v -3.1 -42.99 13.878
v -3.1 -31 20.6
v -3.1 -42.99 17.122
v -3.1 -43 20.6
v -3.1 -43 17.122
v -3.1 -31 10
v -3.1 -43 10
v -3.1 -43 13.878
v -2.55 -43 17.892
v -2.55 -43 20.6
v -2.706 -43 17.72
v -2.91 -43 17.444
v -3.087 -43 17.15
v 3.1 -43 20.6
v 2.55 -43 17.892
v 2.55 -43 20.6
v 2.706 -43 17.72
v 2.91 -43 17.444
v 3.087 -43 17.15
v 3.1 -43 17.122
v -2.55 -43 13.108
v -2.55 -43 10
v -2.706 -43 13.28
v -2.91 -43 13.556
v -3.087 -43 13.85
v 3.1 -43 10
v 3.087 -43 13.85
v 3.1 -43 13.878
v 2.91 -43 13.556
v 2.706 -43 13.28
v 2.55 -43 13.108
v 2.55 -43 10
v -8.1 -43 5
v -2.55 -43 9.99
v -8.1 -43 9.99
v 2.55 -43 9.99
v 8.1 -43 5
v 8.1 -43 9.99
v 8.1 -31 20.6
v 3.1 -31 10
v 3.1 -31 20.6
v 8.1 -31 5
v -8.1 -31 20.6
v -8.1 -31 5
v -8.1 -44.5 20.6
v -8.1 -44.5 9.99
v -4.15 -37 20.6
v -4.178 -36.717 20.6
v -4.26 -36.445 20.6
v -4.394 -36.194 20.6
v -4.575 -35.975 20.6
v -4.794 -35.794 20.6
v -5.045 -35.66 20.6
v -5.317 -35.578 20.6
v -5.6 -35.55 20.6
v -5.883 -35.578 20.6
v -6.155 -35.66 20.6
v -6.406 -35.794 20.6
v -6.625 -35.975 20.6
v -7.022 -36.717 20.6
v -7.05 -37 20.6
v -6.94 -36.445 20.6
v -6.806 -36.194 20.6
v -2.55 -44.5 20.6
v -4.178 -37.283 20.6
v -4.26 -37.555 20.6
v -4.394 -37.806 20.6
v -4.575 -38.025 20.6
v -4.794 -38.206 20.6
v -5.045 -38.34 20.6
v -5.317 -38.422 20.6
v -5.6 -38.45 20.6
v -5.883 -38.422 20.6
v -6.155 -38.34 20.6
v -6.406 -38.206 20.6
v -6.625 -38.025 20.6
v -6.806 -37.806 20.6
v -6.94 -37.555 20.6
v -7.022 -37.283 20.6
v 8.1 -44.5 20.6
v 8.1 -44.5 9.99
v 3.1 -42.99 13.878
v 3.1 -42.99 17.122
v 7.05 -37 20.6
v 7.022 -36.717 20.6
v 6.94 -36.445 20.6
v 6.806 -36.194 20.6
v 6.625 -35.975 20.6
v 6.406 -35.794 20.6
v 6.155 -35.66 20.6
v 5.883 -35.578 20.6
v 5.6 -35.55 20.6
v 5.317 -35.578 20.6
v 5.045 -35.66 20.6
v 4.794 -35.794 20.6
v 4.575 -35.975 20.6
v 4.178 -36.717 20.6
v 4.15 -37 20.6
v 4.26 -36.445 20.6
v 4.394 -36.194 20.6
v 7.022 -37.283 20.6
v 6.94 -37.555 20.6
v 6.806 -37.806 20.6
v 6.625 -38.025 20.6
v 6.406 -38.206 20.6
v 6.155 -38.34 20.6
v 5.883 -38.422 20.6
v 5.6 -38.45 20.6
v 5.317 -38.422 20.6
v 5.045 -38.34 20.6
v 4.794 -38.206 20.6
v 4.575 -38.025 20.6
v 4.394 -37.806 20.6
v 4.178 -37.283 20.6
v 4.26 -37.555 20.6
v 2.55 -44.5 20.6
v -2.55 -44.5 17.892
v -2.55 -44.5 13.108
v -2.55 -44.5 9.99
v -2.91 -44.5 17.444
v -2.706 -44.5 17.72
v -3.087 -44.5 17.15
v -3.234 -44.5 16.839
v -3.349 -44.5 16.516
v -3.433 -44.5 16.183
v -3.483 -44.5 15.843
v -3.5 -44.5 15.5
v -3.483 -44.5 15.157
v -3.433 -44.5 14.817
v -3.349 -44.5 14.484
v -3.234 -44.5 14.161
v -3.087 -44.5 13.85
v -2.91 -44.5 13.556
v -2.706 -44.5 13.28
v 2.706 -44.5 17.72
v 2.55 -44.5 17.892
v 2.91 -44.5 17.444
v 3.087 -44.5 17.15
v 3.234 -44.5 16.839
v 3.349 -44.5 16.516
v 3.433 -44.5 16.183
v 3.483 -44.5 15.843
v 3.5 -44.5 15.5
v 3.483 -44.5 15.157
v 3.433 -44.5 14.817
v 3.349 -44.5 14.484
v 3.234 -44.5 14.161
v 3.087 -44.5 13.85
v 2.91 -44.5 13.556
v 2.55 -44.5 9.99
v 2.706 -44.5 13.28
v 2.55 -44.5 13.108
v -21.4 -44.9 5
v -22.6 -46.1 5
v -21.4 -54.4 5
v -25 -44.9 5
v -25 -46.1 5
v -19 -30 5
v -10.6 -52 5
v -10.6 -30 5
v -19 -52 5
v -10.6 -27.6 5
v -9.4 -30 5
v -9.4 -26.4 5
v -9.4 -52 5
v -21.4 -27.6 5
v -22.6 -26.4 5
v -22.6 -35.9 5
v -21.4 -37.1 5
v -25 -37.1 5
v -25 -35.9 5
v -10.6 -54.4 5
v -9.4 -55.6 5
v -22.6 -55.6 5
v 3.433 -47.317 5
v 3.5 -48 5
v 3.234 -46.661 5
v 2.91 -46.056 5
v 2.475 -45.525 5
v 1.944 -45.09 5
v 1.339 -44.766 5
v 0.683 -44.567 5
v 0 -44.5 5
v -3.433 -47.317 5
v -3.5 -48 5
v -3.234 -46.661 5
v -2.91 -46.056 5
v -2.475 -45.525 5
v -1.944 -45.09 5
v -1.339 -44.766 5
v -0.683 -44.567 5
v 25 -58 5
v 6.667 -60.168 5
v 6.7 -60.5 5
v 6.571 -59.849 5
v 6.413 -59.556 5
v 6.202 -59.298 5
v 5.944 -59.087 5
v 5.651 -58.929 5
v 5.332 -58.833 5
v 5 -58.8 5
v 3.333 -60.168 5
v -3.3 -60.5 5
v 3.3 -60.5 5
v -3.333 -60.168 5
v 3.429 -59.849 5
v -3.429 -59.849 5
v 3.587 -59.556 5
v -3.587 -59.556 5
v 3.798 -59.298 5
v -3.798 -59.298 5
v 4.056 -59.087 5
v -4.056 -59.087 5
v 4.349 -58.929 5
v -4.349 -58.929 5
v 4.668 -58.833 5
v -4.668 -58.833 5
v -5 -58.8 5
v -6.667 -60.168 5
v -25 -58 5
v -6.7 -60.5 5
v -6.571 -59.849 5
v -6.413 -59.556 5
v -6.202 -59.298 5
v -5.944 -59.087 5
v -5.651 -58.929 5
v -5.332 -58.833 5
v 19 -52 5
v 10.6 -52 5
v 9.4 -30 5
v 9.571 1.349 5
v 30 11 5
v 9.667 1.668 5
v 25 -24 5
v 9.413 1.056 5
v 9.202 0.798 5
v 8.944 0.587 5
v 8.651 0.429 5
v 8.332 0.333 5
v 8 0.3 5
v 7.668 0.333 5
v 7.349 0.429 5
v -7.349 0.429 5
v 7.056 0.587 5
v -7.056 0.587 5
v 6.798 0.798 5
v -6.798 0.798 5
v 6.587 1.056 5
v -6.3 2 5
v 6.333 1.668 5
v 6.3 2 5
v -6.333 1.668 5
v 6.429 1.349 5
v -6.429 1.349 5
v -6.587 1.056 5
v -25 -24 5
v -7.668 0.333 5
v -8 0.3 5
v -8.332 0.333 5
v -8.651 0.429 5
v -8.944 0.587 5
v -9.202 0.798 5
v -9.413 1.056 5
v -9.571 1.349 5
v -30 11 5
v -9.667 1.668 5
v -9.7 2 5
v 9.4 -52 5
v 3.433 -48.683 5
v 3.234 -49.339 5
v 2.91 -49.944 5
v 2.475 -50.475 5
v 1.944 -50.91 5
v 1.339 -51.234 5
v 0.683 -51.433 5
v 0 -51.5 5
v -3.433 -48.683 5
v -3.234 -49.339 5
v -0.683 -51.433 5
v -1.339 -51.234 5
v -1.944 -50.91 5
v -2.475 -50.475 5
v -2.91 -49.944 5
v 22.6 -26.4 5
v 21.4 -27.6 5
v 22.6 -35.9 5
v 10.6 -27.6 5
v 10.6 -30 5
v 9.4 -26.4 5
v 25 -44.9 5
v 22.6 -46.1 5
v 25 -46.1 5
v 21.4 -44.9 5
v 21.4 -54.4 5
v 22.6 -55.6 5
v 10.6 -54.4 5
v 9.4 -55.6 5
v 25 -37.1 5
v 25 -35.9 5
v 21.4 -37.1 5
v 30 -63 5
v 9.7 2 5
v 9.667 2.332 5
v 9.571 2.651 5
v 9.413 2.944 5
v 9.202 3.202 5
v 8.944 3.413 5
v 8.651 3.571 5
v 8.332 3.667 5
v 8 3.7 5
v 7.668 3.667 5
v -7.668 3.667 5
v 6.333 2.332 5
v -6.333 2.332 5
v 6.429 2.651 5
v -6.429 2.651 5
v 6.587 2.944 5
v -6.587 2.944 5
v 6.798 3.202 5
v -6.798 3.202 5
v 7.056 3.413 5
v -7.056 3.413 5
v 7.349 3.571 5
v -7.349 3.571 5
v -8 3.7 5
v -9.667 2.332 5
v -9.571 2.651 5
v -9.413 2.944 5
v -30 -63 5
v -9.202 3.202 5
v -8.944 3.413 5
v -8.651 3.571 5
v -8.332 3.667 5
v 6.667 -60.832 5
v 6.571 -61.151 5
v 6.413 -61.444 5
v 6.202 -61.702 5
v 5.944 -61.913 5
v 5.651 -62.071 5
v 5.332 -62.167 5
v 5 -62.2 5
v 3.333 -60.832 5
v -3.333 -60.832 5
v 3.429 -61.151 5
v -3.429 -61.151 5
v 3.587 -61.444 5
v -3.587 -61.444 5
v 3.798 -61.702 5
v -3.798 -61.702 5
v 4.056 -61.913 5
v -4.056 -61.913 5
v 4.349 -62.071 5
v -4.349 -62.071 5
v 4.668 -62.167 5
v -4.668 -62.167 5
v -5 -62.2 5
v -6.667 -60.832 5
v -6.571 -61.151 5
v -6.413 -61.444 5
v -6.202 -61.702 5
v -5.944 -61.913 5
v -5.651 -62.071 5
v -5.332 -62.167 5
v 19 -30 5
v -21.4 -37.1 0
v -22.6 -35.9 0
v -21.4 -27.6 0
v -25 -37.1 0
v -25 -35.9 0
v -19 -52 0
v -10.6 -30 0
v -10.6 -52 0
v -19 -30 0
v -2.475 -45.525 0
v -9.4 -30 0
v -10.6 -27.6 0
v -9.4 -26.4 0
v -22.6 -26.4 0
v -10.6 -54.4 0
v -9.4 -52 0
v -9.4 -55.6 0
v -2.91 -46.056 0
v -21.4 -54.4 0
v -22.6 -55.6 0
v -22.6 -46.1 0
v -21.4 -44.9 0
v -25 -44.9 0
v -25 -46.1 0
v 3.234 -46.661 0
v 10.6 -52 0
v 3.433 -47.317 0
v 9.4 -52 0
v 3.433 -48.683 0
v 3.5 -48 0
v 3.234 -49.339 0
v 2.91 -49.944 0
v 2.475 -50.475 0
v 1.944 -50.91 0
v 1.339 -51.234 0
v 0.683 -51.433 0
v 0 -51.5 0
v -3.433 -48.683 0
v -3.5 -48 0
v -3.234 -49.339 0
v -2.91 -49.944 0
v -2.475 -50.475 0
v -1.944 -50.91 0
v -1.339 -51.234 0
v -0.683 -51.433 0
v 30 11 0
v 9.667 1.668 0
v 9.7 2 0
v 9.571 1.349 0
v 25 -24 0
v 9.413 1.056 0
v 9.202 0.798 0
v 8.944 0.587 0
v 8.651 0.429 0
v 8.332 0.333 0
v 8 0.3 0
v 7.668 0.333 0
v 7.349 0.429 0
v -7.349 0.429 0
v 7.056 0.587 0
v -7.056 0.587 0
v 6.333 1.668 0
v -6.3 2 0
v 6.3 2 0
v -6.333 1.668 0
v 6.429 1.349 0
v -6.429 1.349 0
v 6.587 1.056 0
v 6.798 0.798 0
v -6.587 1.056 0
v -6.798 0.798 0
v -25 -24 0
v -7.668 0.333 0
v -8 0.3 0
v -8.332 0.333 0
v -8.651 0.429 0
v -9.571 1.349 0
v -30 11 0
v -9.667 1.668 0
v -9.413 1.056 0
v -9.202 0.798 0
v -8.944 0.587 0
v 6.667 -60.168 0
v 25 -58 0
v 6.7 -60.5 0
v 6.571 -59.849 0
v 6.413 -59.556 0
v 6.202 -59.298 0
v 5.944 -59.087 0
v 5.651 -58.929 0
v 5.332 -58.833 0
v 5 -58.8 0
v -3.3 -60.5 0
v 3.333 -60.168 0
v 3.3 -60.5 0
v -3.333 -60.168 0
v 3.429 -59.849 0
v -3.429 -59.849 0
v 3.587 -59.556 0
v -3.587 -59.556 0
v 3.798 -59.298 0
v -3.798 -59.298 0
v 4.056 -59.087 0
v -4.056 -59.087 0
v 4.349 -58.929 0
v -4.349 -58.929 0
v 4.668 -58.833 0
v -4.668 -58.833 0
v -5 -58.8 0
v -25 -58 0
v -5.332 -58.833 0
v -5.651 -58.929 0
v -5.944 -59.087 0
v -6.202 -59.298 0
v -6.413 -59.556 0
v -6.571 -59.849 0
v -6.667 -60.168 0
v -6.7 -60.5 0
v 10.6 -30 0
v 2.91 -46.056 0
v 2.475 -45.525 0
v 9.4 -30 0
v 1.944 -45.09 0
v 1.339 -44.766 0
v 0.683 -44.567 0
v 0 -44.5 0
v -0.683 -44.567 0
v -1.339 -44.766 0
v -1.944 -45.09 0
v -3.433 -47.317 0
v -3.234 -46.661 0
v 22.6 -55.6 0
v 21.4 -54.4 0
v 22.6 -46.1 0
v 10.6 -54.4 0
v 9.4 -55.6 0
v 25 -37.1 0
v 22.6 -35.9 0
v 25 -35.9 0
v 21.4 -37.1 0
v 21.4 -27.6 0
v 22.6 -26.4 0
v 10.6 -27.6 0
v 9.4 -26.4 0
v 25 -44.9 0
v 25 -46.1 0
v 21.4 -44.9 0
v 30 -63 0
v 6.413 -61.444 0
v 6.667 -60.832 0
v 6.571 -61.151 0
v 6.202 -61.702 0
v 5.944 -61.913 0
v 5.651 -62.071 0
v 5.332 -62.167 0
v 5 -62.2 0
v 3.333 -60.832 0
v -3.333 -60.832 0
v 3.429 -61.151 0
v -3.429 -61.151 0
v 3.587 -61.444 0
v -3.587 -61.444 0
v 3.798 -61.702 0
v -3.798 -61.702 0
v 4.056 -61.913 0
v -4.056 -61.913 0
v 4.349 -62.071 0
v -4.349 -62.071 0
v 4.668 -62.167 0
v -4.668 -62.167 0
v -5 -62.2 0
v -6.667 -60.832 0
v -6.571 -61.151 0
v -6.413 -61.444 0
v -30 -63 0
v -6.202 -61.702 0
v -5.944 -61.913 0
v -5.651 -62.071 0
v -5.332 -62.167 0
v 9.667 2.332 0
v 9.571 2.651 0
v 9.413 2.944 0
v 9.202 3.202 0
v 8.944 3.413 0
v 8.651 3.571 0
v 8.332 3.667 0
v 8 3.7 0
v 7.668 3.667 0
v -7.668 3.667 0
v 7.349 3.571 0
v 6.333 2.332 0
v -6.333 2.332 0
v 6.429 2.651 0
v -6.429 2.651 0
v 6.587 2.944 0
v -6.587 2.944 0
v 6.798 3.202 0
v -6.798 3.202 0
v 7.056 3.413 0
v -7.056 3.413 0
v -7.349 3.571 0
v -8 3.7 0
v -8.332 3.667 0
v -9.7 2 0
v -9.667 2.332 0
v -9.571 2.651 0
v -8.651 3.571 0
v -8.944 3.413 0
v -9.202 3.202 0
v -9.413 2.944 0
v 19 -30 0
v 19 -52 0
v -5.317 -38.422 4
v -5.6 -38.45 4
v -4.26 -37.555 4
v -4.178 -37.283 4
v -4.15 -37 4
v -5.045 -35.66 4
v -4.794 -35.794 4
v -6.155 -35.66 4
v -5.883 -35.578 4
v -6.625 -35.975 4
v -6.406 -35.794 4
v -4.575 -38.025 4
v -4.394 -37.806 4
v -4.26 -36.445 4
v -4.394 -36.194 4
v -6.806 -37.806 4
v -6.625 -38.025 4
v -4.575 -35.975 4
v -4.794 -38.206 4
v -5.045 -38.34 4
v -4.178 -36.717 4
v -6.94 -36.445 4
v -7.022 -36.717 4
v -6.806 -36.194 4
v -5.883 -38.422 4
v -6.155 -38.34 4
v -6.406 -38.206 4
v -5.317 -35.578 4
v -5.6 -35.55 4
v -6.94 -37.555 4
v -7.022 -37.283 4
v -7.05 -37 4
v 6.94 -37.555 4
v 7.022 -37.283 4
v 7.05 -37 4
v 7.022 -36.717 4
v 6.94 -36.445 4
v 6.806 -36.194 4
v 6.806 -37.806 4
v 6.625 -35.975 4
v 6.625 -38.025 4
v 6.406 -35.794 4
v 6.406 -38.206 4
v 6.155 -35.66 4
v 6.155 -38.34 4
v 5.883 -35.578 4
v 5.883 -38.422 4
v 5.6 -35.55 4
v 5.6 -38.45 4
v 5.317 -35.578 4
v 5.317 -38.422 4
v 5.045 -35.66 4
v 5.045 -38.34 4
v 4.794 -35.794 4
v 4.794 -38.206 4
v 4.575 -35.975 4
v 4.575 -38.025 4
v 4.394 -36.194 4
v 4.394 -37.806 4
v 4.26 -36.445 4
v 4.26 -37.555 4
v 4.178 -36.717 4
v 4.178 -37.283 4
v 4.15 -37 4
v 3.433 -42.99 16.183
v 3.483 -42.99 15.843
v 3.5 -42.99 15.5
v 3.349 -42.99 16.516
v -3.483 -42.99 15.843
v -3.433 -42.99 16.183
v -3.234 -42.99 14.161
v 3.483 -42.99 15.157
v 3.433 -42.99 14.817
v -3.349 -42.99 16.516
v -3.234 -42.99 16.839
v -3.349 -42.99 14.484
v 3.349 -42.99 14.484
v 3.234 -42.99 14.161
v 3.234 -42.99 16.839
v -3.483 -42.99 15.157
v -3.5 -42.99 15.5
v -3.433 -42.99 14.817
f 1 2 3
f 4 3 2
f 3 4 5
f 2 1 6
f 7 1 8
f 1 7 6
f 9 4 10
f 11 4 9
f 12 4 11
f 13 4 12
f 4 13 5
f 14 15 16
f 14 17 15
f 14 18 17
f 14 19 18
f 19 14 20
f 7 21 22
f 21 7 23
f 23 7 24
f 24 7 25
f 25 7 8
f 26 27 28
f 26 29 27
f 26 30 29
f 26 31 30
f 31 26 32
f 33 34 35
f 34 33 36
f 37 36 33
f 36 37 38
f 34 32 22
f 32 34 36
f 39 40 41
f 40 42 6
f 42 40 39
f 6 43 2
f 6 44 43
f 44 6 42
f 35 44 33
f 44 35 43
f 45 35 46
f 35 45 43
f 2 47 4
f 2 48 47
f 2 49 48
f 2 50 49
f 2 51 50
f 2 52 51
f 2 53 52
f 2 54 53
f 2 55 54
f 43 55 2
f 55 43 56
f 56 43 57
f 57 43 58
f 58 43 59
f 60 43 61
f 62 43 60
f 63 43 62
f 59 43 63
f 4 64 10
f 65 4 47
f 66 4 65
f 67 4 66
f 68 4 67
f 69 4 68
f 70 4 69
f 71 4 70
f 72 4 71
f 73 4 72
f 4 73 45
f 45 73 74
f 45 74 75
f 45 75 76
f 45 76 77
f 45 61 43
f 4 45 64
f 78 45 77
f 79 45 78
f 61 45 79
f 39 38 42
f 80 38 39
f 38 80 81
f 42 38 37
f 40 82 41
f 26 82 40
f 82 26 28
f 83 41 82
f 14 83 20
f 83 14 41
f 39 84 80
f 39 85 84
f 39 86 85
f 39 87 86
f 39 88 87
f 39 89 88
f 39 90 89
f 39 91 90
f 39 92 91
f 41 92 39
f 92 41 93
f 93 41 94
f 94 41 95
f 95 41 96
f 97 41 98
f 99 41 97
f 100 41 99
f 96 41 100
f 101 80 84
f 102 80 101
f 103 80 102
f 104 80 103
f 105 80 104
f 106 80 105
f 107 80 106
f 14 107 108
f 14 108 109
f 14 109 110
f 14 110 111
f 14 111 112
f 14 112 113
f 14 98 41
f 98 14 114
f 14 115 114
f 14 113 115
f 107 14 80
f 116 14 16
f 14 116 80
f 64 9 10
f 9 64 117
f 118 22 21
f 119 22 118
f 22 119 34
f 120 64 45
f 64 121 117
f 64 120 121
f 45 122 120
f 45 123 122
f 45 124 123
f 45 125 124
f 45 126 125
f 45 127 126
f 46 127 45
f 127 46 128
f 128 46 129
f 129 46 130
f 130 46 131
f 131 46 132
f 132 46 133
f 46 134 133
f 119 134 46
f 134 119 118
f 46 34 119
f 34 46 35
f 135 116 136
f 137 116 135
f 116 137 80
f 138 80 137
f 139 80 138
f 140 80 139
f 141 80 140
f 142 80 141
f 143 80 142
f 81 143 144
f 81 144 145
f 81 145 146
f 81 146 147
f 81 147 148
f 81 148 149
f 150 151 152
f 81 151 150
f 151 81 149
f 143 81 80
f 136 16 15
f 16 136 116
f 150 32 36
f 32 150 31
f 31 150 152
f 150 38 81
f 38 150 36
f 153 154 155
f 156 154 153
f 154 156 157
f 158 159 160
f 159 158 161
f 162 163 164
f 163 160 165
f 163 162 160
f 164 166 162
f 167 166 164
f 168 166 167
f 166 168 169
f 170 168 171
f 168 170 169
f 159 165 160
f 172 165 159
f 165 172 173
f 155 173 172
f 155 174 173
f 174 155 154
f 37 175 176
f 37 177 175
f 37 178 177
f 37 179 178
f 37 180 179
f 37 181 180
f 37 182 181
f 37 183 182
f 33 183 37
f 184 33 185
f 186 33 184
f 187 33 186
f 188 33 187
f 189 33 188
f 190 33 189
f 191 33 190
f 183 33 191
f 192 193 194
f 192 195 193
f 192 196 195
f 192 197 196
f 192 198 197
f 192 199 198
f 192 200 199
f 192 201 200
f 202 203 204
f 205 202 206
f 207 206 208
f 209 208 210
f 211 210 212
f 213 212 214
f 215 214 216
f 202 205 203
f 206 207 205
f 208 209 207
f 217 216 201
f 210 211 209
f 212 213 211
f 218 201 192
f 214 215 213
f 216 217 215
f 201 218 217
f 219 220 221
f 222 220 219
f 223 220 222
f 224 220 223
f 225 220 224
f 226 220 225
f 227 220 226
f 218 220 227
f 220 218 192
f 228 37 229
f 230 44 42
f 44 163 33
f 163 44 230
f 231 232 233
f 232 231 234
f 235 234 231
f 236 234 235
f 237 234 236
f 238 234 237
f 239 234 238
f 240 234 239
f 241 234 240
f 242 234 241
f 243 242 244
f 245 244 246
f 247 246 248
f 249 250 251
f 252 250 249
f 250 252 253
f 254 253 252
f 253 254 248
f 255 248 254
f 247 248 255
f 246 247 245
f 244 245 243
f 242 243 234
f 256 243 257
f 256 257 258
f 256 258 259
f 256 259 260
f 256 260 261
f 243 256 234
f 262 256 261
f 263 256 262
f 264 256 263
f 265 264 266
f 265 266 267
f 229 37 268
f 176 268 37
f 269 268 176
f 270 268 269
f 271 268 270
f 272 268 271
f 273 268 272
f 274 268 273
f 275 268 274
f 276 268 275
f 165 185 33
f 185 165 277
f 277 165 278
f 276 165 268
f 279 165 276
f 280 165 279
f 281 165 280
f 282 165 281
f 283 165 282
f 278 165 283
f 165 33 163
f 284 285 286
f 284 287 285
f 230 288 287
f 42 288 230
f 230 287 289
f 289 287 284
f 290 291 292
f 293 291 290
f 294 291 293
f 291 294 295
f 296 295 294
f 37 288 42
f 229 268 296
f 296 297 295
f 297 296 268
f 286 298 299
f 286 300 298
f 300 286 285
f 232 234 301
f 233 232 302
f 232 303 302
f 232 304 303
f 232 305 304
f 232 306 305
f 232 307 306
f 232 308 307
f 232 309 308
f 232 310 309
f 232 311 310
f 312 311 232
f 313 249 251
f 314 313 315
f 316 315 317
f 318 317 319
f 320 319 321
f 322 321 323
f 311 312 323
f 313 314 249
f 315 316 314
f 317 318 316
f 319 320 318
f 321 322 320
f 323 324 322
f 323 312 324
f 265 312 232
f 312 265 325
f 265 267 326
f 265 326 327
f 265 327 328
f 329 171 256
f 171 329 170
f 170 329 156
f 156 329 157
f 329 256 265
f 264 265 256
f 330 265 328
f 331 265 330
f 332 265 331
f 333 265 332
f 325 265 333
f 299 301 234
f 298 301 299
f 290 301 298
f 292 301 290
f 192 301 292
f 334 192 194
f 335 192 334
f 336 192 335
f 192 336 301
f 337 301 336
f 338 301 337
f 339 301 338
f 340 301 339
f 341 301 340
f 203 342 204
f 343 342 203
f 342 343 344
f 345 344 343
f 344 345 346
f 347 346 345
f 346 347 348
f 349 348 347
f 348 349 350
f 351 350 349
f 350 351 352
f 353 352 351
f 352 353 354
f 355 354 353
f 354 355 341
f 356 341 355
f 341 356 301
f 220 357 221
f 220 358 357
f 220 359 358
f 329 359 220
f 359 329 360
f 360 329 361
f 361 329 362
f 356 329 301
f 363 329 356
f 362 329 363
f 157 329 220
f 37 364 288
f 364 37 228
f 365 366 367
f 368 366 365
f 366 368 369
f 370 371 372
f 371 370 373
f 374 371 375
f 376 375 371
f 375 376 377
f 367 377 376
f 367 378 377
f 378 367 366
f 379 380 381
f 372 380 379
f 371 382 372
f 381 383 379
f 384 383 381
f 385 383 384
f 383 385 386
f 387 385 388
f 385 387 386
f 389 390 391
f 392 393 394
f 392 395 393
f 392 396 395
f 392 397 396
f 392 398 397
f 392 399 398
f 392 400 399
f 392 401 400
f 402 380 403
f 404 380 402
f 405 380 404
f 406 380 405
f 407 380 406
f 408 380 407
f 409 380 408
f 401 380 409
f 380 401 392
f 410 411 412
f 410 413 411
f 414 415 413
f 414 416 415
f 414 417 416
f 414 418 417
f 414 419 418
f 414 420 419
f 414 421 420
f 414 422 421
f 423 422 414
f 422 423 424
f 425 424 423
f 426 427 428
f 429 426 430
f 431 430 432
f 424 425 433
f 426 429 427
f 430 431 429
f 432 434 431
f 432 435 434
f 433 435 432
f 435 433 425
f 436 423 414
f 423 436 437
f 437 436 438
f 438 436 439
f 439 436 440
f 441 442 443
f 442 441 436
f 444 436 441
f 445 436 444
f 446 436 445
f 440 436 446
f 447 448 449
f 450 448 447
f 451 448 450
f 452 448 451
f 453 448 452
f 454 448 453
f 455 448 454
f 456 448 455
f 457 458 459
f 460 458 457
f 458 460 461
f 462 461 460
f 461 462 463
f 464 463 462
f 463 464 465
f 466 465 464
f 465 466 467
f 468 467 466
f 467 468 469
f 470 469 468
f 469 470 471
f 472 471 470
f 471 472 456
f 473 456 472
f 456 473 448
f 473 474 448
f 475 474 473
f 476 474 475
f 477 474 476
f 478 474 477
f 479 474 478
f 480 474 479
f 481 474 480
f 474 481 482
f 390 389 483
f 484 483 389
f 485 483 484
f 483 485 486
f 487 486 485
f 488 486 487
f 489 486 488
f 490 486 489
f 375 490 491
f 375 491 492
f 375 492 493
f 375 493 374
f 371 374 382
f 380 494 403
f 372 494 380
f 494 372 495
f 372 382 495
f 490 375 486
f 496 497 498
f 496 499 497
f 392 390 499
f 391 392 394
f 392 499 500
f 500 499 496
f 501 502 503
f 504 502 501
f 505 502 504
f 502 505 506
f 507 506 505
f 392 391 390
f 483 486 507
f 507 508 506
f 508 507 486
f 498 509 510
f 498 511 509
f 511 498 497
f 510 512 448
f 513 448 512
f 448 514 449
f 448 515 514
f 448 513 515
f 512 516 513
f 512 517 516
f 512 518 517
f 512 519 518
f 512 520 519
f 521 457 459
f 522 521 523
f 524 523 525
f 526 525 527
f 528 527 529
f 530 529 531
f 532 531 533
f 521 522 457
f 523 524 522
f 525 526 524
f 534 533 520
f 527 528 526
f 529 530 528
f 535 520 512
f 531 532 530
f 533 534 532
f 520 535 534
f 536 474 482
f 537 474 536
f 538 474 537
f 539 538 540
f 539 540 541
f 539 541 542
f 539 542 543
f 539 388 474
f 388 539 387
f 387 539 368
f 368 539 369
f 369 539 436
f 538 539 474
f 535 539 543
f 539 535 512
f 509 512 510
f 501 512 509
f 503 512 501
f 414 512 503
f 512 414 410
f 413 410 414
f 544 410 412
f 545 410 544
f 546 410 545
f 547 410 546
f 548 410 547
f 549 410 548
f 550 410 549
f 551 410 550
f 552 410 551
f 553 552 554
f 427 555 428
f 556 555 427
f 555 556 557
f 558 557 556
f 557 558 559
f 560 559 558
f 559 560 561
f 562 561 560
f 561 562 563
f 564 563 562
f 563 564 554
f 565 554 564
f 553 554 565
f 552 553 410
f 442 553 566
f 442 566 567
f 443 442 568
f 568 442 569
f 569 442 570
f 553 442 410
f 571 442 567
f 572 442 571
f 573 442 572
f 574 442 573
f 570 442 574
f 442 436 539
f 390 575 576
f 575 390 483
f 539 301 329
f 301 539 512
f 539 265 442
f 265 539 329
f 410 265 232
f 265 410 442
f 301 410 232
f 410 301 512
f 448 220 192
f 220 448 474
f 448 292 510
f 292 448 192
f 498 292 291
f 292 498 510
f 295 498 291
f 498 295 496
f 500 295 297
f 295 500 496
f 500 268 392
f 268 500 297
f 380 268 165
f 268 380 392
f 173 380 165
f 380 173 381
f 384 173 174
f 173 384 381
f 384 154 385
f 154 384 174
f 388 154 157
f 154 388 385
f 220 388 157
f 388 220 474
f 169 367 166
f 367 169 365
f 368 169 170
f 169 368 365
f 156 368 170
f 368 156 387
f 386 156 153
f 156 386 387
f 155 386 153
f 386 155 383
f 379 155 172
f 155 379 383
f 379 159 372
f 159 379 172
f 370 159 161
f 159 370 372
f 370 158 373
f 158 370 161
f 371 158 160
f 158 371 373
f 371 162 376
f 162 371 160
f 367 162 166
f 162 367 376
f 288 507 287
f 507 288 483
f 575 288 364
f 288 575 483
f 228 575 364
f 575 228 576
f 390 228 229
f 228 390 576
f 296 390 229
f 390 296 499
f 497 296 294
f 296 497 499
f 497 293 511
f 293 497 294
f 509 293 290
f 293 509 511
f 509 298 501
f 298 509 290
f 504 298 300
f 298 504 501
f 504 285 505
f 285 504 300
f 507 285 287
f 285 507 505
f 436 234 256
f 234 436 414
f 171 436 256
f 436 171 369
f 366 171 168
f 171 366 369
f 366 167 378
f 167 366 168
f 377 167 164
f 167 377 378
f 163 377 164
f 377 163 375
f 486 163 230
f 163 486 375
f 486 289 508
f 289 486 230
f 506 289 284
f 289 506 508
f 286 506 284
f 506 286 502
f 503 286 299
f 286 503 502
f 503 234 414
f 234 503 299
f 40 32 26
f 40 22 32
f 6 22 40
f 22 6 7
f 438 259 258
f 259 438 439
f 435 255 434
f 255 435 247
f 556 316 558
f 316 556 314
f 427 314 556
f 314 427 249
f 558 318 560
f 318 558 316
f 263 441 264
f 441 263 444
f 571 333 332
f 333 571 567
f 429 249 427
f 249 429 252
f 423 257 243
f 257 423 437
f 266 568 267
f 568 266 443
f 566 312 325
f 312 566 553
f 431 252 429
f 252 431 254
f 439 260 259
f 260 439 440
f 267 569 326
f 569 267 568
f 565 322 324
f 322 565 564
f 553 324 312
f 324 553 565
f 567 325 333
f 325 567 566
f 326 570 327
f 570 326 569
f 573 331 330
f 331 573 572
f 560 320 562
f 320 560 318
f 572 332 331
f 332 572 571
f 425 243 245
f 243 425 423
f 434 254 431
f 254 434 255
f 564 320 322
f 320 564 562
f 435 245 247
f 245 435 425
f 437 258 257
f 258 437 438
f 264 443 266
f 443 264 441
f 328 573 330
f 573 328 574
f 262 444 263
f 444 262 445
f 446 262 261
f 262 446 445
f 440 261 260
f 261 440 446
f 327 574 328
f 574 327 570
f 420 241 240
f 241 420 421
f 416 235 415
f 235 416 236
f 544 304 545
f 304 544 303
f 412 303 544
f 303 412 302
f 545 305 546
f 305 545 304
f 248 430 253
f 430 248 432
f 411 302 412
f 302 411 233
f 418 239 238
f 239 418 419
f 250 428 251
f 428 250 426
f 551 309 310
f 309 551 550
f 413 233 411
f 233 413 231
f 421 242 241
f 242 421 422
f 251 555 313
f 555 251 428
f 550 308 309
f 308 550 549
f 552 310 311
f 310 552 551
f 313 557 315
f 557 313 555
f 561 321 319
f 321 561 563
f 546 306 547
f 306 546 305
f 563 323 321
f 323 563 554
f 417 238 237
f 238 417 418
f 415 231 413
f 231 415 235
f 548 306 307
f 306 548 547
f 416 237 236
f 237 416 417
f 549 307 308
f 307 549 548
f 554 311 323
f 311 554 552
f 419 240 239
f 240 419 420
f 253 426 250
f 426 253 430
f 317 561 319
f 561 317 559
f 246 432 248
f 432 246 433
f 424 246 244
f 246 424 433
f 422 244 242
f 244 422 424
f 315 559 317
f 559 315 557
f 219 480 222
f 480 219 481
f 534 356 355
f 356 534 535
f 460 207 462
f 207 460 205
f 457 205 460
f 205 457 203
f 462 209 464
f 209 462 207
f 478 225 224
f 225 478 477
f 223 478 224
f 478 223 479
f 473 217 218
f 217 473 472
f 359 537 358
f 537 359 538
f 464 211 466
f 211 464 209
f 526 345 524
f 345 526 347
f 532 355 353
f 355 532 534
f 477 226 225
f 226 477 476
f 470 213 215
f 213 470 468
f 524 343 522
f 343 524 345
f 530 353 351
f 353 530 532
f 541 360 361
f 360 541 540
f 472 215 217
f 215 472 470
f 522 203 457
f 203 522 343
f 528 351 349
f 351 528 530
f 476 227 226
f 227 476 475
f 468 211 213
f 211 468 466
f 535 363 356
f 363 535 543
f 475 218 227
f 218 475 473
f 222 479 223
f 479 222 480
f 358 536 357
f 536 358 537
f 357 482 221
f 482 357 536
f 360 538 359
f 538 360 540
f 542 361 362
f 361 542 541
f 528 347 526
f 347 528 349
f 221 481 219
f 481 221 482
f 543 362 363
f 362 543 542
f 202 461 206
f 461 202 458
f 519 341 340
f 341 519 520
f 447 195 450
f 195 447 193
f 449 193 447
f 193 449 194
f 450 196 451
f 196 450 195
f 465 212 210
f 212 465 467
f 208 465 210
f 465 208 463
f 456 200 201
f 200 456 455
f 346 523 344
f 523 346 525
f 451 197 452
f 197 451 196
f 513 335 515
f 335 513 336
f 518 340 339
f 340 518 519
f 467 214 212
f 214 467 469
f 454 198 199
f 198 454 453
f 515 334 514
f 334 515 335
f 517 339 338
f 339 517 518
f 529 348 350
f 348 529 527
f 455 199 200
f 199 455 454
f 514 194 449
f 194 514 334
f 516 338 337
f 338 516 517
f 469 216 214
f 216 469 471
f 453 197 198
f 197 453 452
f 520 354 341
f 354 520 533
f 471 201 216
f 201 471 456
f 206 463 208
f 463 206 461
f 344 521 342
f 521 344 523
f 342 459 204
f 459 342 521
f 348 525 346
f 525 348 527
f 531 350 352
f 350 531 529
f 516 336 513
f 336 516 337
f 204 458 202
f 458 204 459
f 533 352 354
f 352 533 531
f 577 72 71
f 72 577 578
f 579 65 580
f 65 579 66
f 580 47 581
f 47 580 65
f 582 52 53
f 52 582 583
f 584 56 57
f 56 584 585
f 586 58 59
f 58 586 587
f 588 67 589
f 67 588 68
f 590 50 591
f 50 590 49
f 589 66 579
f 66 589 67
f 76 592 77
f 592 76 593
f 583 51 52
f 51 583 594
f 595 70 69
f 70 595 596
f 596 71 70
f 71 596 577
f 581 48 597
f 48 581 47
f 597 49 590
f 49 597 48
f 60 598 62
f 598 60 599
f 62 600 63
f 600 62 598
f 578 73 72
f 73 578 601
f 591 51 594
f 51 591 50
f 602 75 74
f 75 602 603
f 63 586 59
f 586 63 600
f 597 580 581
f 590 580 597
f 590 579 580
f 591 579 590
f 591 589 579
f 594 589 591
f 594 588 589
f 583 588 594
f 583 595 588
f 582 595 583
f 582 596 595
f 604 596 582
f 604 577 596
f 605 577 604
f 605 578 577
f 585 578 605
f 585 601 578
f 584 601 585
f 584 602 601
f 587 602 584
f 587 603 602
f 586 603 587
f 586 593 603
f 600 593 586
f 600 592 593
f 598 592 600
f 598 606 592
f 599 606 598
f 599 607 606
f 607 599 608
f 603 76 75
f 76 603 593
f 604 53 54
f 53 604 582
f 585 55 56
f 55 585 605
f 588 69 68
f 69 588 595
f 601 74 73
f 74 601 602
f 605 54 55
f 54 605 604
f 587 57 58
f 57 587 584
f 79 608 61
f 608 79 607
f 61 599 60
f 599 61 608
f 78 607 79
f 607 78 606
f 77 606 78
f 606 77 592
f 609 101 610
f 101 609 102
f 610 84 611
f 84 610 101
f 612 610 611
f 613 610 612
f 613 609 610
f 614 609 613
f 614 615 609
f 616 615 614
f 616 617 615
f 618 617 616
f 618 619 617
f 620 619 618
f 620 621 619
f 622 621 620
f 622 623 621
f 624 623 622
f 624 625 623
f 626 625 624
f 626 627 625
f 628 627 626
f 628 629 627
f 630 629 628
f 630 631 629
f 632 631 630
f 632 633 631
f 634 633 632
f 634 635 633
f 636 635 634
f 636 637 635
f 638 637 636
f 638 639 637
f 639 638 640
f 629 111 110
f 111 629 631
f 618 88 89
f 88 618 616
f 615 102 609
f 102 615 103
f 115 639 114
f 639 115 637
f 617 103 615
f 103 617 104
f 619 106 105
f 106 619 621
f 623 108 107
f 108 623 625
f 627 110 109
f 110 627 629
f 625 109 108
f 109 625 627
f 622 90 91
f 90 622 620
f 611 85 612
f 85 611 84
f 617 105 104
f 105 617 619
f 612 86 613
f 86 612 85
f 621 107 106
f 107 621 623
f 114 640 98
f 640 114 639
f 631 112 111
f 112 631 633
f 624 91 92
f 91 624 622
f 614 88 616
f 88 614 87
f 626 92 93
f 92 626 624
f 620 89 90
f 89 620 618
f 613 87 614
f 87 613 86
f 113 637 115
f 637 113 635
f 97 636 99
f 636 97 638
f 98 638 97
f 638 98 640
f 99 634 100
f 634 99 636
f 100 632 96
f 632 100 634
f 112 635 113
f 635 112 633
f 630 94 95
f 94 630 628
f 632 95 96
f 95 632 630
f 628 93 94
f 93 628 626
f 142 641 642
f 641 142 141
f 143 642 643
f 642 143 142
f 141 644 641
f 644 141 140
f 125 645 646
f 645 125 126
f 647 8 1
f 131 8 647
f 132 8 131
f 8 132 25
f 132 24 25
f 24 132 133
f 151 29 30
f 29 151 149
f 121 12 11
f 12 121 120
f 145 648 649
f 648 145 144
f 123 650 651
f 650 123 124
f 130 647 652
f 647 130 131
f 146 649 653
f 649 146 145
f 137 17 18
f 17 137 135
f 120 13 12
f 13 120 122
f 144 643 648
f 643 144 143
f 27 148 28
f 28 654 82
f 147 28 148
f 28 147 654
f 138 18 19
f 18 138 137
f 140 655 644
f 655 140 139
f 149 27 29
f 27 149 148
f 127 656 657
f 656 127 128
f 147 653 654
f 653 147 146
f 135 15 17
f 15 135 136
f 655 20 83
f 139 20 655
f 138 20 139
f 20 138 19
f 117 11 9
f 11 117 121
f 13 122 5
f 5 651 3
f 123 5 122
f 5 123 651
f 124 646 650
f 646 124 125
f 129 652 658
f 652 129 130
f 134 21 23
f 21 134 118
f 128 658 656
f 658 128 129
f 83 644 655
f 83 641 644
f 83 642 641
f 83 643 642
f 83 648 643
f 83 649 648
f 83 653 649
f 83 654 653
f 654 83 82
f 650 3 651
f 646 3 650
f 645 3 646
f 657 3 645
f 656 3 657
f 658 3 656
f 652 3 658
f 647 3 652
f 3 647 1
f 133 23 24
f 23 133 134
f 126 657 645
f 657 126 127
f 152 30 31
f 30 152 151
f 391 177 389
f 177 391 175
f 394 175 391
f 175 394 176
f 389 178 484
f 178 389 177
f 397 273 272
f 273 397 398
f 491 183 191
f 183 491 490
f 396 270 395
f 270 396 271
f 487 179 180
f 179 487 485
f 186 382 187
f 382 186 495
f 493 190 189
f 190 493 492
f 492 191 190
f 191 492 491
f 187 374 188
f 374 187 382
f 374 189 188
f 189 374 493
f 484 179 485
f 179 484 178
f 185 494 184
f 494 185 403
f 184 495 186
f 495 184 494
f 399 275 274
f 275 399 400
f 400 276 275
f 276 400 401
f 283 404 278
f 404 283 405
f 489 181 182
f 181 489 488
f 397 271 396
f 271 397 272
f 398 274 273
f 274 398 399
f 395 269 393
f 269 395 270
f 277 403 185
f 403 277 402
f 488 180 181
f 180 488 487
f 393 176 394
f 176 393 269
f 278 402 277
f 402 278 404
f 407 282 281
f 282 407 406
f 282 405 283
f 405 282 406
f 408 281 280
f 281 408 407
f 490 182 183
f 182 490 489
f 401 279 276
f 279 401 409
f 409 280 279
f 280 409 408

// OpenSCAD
// file: ../port_tower.scad
// ============================================================
//  Female port tower: positioning stage (rotated 180 deg so its
//  payload face looks toward -Y) + bracket plate with the keyed
//  D-hole. The bulkhead goes in from the back (flange behind the
//  plate), nut on the front. Plate front face is at world y=0.
// ============================================================
include <stage.scad>

bracket_w      = 36;
bracket_hole_dz = port_z - stage_payload_z;   // hole above payload centre
bracket_bot    = -zs_h / 2;
bracket_top    = bracket_hole_dz + bh_nut_af / cos(30) / 2 + 3;
rib_t          = 5;     // rib width (X)
rib_d          = 7;     // rib depth (out of the plate front)

// Payload-face coordinates: origin at face centre, +Y away from the stage.
module port_bracket() {
    difference() {
        union() {
            translate([-bracket_w / 2, 0, bracket_bot]) cube([bracket_w, plate_t, bracket_top - bracket_bot]);
            // stiffening ribs, outboard of the nut and clear of the plug clamp
            for (sx = [-1, 1])
                translate([sx > 0 ? bracket_w / 2 - rib_t : -bracket_w / 2, plate_t - 0.01, bracket_bot])
                    hull() {
                        cube([rib_t, rib_d, 1]);
                        translate([0, 0, bracket_hole_dz - 14]) cube([rib_t, 0.01, 1]);
                    }
        }
        // keyed D-hole, flat on top
        translate([0, plate_t, bracket_hole_dz]) rotate([90, 0, 0]) d_hole(t = plate_t);
        // mounting screws into the z-slider's captive nuts
        for (p = payload_pts) translate([p[0], -0.01, p[1]]) rotate([-90, 0, 0]) {
            screw_hole(m3_d, plate_t + rib_d);
        }
    }
}

// Whole tower in world coordinates at fine-travel offset (dx, dz),
// measured in world X / Z.
// Tower B (i=1) is the mirror image so its X adjust screw faces outward.
module port_tower_world(i, dx = 0, dz = 0) {
    ldx = i == 0 ? -dx : dx;   // world dx -> stage-local dx
    translate([tower_x(i), tower_y, 0]) rotate([0, 0, 180]) stage_hand(i == 1) {
        stage_assembly(ldx, dz, base = false); // base is part of the X base
        stage_payload_origin(ldx, dz) show("port_bracket") color("Orange") port_bracket();
    }
}

// Bulkhead connector stand-in (for checks / preview), world coords.
module bulkhead_world(i, dx = 0, dz = 0) {
    translate([port_x[i] + dx, port_face_y, port_z + dz]) rotate([90, 0, 0]) show("bulkhead") color("DimGray") {
        cylinder(d = bh_thread_d, h = bh_thread_len - plate_t);                   // thread + face
        cylinder(d = bh_nut_af / cos(30), h = bh_nut_t, $fn = 6);                  // nut
        translate([0, 0, -plate_t - 2]) cylinder(d = bh_flange_d, h = 2);          // flange
        translate([0, 0, -plate_t - 40]) cylinder(d = 14, h = 38);                 // body
    }
}

echo("CHECK", "port_z", port_z);
// file: ../plug_mount.scad
// ============================================================
//  Male plug mount: flexure (frame + 4 L-beams + floating island with
//  the clamp cradle built in), clamp cap, and two identical stop
//  straps (front + back) whose pins limit X/Z float to +/-flex_float
//  and whose 1 mm standoff limits Y float to +/-flex_stop_gap.
//  Local coords: origin at the stage payload face centre, +Y away from
//  the stage, Z relative to the payload centre.
// ============================================================
include <port_tower.scad>
include <axes.scad>

plug_dz = port_z - (yc_top + stage_payload_z); // plug centre above payload centre
blk_x = plug_bx / 2 + 0.1; // snug in X
blk_y0 = flex_t + clamp_wall; // block back face
blk_y1 = blk_y0 + plug_by; // block front face
blk_z0 = plug_dz + plug_drop; // block bottom
blk_z1 = blk_z0 + plug_block[2];
crad_x = blk_x + 5; // cradle half width
crad_y1 = blk_y1 - 0.4; // cradle stops short: cap clamps the block
cap_back_y = crad_y1;
crad_scr = blk_x + 2.5; // cradle screw X
lip_in = plug_bx / 2 - 0.45; // top lips overlap the block by 0.55 mm
relief_hole_d = 7; // through the lips, centred on the cable

isl_x = 19; // island half width
isl_z0 = blk_z0 - 1;
isl_z1 = isl_z0 + flex_isl_h;
flex_g = 6; // island-to-frame gap
in_x = isl_x + flex_g;
in_z0 = isl_z0 - flex_g;
in_z1 = isl_z1 + flex_g;
fr_bar = 5;
fr_x = in_x + fr_bar;
fr_z0 = -zs_h / 2;
fr_z1 = in_z1 + fr_bar;

pin_d = 4;
pin_z = isl_z1 - 4;
pin_hole = pin_d + 2 * flex_float;
strap_w = 8;
strap_t = 3;
strap_foot_w = 18;
strap_z0 = pin_z - 4;
strap_scr = [-5, 5]; // strap screw X (through the top bar)
strap_scr_z = (in_z1 + fr_z1) / 2;

// one L-beam: island bottom face -> down -> outward -> up -> frame side
leg = 3;
function beam_path(sx, sz) =
  let (
    zc = (isl_z0 + isl_z1) / 2,
    zi = sz < 0 ? isl_z0 : isl_z1,
    zh = zi + sz * leg,
    zv = zc + sz * (flex_g - 2 + 0.5),
    xv = sx * (isl_x + leg)
  ) [[sx * 10, zi], [sx * 10, zh], [xv, zh], [xv, zv], [sx * in_x, zv]];

module poly_beam(pts, w) {
  for (k = [0:len(pts) - 2])
    hull() {
      translate(pts[k]) square(w, center=true);
      translate(pts[k + 1]) square(w, center=true);
    }
}

// XZ outline helpers: 2D (x, z) extruded along +Y from y0, thickness t
module xz_extrude(y0, t, convexity=4) { translate([0, y0 + t, 0]) rotate([90, 0, 0]) linear_extrude(height=t, convexity=convexity) children(); }

module plug_flexure() {
  difference() {
    union() {
      xz_extrude(0, flex_t) {
        difference() {
          translate([-fr_x, fr_z0]) square([2 * fr_x, fr_z1 - fr_z0]);
          translate([-in_x, in_z0]) square([2 * in_x, in_z1 - in_z0]);
        }
        translate([-isl_x, isl_z0]) square([2 * isl_x, isl_z1 - isl_z0]);
        for (sx = [-1, 1], sz = [-1, 1]) poly_beam(beam_path(sx, sz), flex_beam_w);
      }
      // clamp cradle on the island front: back wall + side walls
      translate([-crad_x, flex_t - 0.01, blk_z0]) cube([2 * crad_x, clamp_wall + 0.01, plug_block[2]]);
      for (sx = [-1, 1])
        translate([sx > 0 ? blk_x : -crad_x, blk_y0 - 0.01, blk_z0])
          cube([crad_x - blk_x, crad_y1 - blk_y0 + 0.01, plug_block[2]]);
      // Z retention: lips over the block's top corners, leaving a slot for
      // the cable. Nothing under the block: the plug's bent body hangs below.
      for (sx = [-1, 1])
        translate([sx > 0 ? lip_in : -crad_x, blk_y0 - 0.01, blk_z1])
          cube([crad_x - lip_in, crad_y1 - blk_y0 + 0.01, 1.5]);
    }
    // hole through the top lips for the cable strain relief (the plug goes
    // in from below)
    translate([0, blk_y0 + plug_by / 2, blk_z1 - 0.01]) cylinder(d=relief_hole_d, h=1.5 + 0.02);
    // payload screws into the stage z-slider
    for (p = payload_pts) translate([p[0], -0.5, p[1]]) rotate([-90, 0, 0]) screw_hole(m3_d, flex_t + 1);
    // stop-pin hole (through) and strap screws (through the top bar)
    translate([0, -0.5, pin_z]) rotate([-90, 0, 0]) screw_hole(pin_hole, flex_t + 1);
    for (x = strap_scr) translate([x, -0.5, strap_scr_z]) rotate([-90, 0, 0]) screw_hole(m3_d, flex_t + 1);
    // cap screws, tapped into the cradle side walls
    for (sx = [-1, 1])
      translate([sx * crad_scr, crad_y1 + 0.01, (blk_z0 + blk_z1) / 2])
        rotate([90, 0, 0]) screw_hole(m3_tap, crad_y1 - flex_t + 1);
  }
}

// Clamp cap: 1.5 mm over the block, thicker over the screws.
module plug_clamp_cap() {
  // flat back at the cradle front: squeezes the block (it stands 0.4 proud)
  difference() {
    union() {
      translate([-crad_x, cap_back_y, blk_z0]) cube([2 * crad_x, blk_y1 - cap_back_y + clamp_lip_t, plug_block[2]]);
      for (sx = [-1, 1])
        translate([sx > 0 ? blk_x : -crad_x, cap_back_y, blk_z0])
          cube([crad_x - blk_x, 4, plug_block[2]]);
    }
    for (sx = [-1, 1])
      translate([sx * crad_scr, cap_back_y - 0.01, (blk_z0 + blk_z1) / 2])
        rotate([-90, 0, 0]) screw_hole(m3_d, 5);
  }
}

// Stop strap in its own frame: back face on y=0, pin toward -Y.
module plug_flex_stop() {
  difference() {
    union() {
      translate([-strap_w / 2, 0, strap_z0]) cube([strap_w, strap_t, fr_z1 - strap_z0]);
      translate([-strap_foot_w / 2, -flex_stop_gap, in_z1]) cube([strap_foot_w, strap_t + flex_stop_gap, fr_z1 - in_z1]);
      translate([0, 0.01, pin_z]) rotate([90, 0, 0]) cylinder(d=pin_d, h=flex_stop_gap + 2);
    }
    for (x = strap_scr)
      translate([x, -flex_stop_gap - 0.5, strap_scr_z]) rotate([-90, 0, 0])
          screw_hole(m3_d, strap_t + flex_stop_gap + 1);
  }
}

module plug_flex_stops_placed() {
  translate([0, flex_t + flex_stop_gap, 0]) plug_flex_stop(); // front
  translate([0, -flex_stop_gap, 0]) mirror([0, 1, 0]) plug_flex_stop(); // back
}

// The plug, as separate pieces so a slide-in path can be swept piecewise:
// each piece is hulled with a copy moved by the vector sweep.
module plug_body_pieces(sweep = [0, 0, 0], relief = true) {
  module sw() { hull() { children(); translate(sweep) children(); } }
  sw() translate([-plug_bx / 2, blk_y0, blk_z0]) cube([plug_bx, plug_by, plug_block[2]]);
  if (relief) sw() translate([0, blk_y0 + plug_by / 2, blk_z1]) cylinder(d=plug_cable_d, h=15); // cable strain relief
  sw() hull() {
    translate([-plug_bx / 2, blk_y0, plug_dz - 4]) cube([plug_bx, plug_by, blk_z0 - plug_dz + 4]);
    translate([0, blk_y1 + plug_head_proj - 1, plug_dz]) rotate([-90, 0, 0]) cylinder(d=8, h=1);
  }
}
module plug_body_local() { show("usb_plug") color("White") plug_body_pieces(); }

// Everything that moves with the plug carriage, minus the plug itself.
module plug_mount_world(x_pos, y_pos, dx = 0, dz = 0) {
  o = ms_origin(x_pos, y_pos);
  translate(o) {
    stage_assembly(dx, dz, base = false); // base is part of the Y carriage
    stage_payload_origin(dx, dz) {
      show("plug_flexure") color("Orange") plug_flexure();
      show("plug_clamp_cap") color("Gold") plug_clamp_cap();
      show("plug_flex_stop") color("Khaki") plug_flex_stops_placed();
    }
  }
}
module plug_body_world(x_pos, y_pos, dx = 0, dz = 0) {
  o = ms_origin(x_pos, y_pos);
  translate(o) stage_payload_origin(dx, dz) plug_body_local();
}

// ---- checks ----
echo("CHECK", "clamp_lip_t", clamp_lip_t);
echo("CHECK", "clamp_preload", blk_y1 - cap_back_y);
echo("CHECK", "clamp_x_play", blk_x - plug_bx / 2);
echo("CHECK", "pillar_above_flex", pillar_top - (yc_top + stage_payload_z + fr_z1));
echo("CHECK", "clamp_bottom_above_plug", blk_z0 - plug_dz);
echo("CHECK", "clamp_lip_overlap", blk_x - lip_in);
// lip left over the block in front of / behind the relief hole (Y)
echo("CHECK", "lip_hold_y", (plug_by - relief_hole_d) / 2);
echo(
  "CHECK", "plug_insert_err",
  (ms_origin(0, y_travel)[1] + payload_face_y + blk_y1 + plug_head_proj) - bh_face_y
);
echo("CHECK", "flex_xz_stop", (pin_hole - pin_d) / 2);
// beam-to-island and beam-to-frame clearance must exceed the stop travel
echo("CHECK", "flex_beam_clear", leg - flex_beam_w / 2);
// main file
// Plug flexure + clamp cradle. Qty 1.
// Print flat on its back face (cradle up). PLA/PETG with flex_beam_w=1.2,
// or TPU (95A) with flex_beam_w around 2 for a softer float.
include <../plug_mount.scad>
rotate([90, 0, 0]) plug_flexure();
